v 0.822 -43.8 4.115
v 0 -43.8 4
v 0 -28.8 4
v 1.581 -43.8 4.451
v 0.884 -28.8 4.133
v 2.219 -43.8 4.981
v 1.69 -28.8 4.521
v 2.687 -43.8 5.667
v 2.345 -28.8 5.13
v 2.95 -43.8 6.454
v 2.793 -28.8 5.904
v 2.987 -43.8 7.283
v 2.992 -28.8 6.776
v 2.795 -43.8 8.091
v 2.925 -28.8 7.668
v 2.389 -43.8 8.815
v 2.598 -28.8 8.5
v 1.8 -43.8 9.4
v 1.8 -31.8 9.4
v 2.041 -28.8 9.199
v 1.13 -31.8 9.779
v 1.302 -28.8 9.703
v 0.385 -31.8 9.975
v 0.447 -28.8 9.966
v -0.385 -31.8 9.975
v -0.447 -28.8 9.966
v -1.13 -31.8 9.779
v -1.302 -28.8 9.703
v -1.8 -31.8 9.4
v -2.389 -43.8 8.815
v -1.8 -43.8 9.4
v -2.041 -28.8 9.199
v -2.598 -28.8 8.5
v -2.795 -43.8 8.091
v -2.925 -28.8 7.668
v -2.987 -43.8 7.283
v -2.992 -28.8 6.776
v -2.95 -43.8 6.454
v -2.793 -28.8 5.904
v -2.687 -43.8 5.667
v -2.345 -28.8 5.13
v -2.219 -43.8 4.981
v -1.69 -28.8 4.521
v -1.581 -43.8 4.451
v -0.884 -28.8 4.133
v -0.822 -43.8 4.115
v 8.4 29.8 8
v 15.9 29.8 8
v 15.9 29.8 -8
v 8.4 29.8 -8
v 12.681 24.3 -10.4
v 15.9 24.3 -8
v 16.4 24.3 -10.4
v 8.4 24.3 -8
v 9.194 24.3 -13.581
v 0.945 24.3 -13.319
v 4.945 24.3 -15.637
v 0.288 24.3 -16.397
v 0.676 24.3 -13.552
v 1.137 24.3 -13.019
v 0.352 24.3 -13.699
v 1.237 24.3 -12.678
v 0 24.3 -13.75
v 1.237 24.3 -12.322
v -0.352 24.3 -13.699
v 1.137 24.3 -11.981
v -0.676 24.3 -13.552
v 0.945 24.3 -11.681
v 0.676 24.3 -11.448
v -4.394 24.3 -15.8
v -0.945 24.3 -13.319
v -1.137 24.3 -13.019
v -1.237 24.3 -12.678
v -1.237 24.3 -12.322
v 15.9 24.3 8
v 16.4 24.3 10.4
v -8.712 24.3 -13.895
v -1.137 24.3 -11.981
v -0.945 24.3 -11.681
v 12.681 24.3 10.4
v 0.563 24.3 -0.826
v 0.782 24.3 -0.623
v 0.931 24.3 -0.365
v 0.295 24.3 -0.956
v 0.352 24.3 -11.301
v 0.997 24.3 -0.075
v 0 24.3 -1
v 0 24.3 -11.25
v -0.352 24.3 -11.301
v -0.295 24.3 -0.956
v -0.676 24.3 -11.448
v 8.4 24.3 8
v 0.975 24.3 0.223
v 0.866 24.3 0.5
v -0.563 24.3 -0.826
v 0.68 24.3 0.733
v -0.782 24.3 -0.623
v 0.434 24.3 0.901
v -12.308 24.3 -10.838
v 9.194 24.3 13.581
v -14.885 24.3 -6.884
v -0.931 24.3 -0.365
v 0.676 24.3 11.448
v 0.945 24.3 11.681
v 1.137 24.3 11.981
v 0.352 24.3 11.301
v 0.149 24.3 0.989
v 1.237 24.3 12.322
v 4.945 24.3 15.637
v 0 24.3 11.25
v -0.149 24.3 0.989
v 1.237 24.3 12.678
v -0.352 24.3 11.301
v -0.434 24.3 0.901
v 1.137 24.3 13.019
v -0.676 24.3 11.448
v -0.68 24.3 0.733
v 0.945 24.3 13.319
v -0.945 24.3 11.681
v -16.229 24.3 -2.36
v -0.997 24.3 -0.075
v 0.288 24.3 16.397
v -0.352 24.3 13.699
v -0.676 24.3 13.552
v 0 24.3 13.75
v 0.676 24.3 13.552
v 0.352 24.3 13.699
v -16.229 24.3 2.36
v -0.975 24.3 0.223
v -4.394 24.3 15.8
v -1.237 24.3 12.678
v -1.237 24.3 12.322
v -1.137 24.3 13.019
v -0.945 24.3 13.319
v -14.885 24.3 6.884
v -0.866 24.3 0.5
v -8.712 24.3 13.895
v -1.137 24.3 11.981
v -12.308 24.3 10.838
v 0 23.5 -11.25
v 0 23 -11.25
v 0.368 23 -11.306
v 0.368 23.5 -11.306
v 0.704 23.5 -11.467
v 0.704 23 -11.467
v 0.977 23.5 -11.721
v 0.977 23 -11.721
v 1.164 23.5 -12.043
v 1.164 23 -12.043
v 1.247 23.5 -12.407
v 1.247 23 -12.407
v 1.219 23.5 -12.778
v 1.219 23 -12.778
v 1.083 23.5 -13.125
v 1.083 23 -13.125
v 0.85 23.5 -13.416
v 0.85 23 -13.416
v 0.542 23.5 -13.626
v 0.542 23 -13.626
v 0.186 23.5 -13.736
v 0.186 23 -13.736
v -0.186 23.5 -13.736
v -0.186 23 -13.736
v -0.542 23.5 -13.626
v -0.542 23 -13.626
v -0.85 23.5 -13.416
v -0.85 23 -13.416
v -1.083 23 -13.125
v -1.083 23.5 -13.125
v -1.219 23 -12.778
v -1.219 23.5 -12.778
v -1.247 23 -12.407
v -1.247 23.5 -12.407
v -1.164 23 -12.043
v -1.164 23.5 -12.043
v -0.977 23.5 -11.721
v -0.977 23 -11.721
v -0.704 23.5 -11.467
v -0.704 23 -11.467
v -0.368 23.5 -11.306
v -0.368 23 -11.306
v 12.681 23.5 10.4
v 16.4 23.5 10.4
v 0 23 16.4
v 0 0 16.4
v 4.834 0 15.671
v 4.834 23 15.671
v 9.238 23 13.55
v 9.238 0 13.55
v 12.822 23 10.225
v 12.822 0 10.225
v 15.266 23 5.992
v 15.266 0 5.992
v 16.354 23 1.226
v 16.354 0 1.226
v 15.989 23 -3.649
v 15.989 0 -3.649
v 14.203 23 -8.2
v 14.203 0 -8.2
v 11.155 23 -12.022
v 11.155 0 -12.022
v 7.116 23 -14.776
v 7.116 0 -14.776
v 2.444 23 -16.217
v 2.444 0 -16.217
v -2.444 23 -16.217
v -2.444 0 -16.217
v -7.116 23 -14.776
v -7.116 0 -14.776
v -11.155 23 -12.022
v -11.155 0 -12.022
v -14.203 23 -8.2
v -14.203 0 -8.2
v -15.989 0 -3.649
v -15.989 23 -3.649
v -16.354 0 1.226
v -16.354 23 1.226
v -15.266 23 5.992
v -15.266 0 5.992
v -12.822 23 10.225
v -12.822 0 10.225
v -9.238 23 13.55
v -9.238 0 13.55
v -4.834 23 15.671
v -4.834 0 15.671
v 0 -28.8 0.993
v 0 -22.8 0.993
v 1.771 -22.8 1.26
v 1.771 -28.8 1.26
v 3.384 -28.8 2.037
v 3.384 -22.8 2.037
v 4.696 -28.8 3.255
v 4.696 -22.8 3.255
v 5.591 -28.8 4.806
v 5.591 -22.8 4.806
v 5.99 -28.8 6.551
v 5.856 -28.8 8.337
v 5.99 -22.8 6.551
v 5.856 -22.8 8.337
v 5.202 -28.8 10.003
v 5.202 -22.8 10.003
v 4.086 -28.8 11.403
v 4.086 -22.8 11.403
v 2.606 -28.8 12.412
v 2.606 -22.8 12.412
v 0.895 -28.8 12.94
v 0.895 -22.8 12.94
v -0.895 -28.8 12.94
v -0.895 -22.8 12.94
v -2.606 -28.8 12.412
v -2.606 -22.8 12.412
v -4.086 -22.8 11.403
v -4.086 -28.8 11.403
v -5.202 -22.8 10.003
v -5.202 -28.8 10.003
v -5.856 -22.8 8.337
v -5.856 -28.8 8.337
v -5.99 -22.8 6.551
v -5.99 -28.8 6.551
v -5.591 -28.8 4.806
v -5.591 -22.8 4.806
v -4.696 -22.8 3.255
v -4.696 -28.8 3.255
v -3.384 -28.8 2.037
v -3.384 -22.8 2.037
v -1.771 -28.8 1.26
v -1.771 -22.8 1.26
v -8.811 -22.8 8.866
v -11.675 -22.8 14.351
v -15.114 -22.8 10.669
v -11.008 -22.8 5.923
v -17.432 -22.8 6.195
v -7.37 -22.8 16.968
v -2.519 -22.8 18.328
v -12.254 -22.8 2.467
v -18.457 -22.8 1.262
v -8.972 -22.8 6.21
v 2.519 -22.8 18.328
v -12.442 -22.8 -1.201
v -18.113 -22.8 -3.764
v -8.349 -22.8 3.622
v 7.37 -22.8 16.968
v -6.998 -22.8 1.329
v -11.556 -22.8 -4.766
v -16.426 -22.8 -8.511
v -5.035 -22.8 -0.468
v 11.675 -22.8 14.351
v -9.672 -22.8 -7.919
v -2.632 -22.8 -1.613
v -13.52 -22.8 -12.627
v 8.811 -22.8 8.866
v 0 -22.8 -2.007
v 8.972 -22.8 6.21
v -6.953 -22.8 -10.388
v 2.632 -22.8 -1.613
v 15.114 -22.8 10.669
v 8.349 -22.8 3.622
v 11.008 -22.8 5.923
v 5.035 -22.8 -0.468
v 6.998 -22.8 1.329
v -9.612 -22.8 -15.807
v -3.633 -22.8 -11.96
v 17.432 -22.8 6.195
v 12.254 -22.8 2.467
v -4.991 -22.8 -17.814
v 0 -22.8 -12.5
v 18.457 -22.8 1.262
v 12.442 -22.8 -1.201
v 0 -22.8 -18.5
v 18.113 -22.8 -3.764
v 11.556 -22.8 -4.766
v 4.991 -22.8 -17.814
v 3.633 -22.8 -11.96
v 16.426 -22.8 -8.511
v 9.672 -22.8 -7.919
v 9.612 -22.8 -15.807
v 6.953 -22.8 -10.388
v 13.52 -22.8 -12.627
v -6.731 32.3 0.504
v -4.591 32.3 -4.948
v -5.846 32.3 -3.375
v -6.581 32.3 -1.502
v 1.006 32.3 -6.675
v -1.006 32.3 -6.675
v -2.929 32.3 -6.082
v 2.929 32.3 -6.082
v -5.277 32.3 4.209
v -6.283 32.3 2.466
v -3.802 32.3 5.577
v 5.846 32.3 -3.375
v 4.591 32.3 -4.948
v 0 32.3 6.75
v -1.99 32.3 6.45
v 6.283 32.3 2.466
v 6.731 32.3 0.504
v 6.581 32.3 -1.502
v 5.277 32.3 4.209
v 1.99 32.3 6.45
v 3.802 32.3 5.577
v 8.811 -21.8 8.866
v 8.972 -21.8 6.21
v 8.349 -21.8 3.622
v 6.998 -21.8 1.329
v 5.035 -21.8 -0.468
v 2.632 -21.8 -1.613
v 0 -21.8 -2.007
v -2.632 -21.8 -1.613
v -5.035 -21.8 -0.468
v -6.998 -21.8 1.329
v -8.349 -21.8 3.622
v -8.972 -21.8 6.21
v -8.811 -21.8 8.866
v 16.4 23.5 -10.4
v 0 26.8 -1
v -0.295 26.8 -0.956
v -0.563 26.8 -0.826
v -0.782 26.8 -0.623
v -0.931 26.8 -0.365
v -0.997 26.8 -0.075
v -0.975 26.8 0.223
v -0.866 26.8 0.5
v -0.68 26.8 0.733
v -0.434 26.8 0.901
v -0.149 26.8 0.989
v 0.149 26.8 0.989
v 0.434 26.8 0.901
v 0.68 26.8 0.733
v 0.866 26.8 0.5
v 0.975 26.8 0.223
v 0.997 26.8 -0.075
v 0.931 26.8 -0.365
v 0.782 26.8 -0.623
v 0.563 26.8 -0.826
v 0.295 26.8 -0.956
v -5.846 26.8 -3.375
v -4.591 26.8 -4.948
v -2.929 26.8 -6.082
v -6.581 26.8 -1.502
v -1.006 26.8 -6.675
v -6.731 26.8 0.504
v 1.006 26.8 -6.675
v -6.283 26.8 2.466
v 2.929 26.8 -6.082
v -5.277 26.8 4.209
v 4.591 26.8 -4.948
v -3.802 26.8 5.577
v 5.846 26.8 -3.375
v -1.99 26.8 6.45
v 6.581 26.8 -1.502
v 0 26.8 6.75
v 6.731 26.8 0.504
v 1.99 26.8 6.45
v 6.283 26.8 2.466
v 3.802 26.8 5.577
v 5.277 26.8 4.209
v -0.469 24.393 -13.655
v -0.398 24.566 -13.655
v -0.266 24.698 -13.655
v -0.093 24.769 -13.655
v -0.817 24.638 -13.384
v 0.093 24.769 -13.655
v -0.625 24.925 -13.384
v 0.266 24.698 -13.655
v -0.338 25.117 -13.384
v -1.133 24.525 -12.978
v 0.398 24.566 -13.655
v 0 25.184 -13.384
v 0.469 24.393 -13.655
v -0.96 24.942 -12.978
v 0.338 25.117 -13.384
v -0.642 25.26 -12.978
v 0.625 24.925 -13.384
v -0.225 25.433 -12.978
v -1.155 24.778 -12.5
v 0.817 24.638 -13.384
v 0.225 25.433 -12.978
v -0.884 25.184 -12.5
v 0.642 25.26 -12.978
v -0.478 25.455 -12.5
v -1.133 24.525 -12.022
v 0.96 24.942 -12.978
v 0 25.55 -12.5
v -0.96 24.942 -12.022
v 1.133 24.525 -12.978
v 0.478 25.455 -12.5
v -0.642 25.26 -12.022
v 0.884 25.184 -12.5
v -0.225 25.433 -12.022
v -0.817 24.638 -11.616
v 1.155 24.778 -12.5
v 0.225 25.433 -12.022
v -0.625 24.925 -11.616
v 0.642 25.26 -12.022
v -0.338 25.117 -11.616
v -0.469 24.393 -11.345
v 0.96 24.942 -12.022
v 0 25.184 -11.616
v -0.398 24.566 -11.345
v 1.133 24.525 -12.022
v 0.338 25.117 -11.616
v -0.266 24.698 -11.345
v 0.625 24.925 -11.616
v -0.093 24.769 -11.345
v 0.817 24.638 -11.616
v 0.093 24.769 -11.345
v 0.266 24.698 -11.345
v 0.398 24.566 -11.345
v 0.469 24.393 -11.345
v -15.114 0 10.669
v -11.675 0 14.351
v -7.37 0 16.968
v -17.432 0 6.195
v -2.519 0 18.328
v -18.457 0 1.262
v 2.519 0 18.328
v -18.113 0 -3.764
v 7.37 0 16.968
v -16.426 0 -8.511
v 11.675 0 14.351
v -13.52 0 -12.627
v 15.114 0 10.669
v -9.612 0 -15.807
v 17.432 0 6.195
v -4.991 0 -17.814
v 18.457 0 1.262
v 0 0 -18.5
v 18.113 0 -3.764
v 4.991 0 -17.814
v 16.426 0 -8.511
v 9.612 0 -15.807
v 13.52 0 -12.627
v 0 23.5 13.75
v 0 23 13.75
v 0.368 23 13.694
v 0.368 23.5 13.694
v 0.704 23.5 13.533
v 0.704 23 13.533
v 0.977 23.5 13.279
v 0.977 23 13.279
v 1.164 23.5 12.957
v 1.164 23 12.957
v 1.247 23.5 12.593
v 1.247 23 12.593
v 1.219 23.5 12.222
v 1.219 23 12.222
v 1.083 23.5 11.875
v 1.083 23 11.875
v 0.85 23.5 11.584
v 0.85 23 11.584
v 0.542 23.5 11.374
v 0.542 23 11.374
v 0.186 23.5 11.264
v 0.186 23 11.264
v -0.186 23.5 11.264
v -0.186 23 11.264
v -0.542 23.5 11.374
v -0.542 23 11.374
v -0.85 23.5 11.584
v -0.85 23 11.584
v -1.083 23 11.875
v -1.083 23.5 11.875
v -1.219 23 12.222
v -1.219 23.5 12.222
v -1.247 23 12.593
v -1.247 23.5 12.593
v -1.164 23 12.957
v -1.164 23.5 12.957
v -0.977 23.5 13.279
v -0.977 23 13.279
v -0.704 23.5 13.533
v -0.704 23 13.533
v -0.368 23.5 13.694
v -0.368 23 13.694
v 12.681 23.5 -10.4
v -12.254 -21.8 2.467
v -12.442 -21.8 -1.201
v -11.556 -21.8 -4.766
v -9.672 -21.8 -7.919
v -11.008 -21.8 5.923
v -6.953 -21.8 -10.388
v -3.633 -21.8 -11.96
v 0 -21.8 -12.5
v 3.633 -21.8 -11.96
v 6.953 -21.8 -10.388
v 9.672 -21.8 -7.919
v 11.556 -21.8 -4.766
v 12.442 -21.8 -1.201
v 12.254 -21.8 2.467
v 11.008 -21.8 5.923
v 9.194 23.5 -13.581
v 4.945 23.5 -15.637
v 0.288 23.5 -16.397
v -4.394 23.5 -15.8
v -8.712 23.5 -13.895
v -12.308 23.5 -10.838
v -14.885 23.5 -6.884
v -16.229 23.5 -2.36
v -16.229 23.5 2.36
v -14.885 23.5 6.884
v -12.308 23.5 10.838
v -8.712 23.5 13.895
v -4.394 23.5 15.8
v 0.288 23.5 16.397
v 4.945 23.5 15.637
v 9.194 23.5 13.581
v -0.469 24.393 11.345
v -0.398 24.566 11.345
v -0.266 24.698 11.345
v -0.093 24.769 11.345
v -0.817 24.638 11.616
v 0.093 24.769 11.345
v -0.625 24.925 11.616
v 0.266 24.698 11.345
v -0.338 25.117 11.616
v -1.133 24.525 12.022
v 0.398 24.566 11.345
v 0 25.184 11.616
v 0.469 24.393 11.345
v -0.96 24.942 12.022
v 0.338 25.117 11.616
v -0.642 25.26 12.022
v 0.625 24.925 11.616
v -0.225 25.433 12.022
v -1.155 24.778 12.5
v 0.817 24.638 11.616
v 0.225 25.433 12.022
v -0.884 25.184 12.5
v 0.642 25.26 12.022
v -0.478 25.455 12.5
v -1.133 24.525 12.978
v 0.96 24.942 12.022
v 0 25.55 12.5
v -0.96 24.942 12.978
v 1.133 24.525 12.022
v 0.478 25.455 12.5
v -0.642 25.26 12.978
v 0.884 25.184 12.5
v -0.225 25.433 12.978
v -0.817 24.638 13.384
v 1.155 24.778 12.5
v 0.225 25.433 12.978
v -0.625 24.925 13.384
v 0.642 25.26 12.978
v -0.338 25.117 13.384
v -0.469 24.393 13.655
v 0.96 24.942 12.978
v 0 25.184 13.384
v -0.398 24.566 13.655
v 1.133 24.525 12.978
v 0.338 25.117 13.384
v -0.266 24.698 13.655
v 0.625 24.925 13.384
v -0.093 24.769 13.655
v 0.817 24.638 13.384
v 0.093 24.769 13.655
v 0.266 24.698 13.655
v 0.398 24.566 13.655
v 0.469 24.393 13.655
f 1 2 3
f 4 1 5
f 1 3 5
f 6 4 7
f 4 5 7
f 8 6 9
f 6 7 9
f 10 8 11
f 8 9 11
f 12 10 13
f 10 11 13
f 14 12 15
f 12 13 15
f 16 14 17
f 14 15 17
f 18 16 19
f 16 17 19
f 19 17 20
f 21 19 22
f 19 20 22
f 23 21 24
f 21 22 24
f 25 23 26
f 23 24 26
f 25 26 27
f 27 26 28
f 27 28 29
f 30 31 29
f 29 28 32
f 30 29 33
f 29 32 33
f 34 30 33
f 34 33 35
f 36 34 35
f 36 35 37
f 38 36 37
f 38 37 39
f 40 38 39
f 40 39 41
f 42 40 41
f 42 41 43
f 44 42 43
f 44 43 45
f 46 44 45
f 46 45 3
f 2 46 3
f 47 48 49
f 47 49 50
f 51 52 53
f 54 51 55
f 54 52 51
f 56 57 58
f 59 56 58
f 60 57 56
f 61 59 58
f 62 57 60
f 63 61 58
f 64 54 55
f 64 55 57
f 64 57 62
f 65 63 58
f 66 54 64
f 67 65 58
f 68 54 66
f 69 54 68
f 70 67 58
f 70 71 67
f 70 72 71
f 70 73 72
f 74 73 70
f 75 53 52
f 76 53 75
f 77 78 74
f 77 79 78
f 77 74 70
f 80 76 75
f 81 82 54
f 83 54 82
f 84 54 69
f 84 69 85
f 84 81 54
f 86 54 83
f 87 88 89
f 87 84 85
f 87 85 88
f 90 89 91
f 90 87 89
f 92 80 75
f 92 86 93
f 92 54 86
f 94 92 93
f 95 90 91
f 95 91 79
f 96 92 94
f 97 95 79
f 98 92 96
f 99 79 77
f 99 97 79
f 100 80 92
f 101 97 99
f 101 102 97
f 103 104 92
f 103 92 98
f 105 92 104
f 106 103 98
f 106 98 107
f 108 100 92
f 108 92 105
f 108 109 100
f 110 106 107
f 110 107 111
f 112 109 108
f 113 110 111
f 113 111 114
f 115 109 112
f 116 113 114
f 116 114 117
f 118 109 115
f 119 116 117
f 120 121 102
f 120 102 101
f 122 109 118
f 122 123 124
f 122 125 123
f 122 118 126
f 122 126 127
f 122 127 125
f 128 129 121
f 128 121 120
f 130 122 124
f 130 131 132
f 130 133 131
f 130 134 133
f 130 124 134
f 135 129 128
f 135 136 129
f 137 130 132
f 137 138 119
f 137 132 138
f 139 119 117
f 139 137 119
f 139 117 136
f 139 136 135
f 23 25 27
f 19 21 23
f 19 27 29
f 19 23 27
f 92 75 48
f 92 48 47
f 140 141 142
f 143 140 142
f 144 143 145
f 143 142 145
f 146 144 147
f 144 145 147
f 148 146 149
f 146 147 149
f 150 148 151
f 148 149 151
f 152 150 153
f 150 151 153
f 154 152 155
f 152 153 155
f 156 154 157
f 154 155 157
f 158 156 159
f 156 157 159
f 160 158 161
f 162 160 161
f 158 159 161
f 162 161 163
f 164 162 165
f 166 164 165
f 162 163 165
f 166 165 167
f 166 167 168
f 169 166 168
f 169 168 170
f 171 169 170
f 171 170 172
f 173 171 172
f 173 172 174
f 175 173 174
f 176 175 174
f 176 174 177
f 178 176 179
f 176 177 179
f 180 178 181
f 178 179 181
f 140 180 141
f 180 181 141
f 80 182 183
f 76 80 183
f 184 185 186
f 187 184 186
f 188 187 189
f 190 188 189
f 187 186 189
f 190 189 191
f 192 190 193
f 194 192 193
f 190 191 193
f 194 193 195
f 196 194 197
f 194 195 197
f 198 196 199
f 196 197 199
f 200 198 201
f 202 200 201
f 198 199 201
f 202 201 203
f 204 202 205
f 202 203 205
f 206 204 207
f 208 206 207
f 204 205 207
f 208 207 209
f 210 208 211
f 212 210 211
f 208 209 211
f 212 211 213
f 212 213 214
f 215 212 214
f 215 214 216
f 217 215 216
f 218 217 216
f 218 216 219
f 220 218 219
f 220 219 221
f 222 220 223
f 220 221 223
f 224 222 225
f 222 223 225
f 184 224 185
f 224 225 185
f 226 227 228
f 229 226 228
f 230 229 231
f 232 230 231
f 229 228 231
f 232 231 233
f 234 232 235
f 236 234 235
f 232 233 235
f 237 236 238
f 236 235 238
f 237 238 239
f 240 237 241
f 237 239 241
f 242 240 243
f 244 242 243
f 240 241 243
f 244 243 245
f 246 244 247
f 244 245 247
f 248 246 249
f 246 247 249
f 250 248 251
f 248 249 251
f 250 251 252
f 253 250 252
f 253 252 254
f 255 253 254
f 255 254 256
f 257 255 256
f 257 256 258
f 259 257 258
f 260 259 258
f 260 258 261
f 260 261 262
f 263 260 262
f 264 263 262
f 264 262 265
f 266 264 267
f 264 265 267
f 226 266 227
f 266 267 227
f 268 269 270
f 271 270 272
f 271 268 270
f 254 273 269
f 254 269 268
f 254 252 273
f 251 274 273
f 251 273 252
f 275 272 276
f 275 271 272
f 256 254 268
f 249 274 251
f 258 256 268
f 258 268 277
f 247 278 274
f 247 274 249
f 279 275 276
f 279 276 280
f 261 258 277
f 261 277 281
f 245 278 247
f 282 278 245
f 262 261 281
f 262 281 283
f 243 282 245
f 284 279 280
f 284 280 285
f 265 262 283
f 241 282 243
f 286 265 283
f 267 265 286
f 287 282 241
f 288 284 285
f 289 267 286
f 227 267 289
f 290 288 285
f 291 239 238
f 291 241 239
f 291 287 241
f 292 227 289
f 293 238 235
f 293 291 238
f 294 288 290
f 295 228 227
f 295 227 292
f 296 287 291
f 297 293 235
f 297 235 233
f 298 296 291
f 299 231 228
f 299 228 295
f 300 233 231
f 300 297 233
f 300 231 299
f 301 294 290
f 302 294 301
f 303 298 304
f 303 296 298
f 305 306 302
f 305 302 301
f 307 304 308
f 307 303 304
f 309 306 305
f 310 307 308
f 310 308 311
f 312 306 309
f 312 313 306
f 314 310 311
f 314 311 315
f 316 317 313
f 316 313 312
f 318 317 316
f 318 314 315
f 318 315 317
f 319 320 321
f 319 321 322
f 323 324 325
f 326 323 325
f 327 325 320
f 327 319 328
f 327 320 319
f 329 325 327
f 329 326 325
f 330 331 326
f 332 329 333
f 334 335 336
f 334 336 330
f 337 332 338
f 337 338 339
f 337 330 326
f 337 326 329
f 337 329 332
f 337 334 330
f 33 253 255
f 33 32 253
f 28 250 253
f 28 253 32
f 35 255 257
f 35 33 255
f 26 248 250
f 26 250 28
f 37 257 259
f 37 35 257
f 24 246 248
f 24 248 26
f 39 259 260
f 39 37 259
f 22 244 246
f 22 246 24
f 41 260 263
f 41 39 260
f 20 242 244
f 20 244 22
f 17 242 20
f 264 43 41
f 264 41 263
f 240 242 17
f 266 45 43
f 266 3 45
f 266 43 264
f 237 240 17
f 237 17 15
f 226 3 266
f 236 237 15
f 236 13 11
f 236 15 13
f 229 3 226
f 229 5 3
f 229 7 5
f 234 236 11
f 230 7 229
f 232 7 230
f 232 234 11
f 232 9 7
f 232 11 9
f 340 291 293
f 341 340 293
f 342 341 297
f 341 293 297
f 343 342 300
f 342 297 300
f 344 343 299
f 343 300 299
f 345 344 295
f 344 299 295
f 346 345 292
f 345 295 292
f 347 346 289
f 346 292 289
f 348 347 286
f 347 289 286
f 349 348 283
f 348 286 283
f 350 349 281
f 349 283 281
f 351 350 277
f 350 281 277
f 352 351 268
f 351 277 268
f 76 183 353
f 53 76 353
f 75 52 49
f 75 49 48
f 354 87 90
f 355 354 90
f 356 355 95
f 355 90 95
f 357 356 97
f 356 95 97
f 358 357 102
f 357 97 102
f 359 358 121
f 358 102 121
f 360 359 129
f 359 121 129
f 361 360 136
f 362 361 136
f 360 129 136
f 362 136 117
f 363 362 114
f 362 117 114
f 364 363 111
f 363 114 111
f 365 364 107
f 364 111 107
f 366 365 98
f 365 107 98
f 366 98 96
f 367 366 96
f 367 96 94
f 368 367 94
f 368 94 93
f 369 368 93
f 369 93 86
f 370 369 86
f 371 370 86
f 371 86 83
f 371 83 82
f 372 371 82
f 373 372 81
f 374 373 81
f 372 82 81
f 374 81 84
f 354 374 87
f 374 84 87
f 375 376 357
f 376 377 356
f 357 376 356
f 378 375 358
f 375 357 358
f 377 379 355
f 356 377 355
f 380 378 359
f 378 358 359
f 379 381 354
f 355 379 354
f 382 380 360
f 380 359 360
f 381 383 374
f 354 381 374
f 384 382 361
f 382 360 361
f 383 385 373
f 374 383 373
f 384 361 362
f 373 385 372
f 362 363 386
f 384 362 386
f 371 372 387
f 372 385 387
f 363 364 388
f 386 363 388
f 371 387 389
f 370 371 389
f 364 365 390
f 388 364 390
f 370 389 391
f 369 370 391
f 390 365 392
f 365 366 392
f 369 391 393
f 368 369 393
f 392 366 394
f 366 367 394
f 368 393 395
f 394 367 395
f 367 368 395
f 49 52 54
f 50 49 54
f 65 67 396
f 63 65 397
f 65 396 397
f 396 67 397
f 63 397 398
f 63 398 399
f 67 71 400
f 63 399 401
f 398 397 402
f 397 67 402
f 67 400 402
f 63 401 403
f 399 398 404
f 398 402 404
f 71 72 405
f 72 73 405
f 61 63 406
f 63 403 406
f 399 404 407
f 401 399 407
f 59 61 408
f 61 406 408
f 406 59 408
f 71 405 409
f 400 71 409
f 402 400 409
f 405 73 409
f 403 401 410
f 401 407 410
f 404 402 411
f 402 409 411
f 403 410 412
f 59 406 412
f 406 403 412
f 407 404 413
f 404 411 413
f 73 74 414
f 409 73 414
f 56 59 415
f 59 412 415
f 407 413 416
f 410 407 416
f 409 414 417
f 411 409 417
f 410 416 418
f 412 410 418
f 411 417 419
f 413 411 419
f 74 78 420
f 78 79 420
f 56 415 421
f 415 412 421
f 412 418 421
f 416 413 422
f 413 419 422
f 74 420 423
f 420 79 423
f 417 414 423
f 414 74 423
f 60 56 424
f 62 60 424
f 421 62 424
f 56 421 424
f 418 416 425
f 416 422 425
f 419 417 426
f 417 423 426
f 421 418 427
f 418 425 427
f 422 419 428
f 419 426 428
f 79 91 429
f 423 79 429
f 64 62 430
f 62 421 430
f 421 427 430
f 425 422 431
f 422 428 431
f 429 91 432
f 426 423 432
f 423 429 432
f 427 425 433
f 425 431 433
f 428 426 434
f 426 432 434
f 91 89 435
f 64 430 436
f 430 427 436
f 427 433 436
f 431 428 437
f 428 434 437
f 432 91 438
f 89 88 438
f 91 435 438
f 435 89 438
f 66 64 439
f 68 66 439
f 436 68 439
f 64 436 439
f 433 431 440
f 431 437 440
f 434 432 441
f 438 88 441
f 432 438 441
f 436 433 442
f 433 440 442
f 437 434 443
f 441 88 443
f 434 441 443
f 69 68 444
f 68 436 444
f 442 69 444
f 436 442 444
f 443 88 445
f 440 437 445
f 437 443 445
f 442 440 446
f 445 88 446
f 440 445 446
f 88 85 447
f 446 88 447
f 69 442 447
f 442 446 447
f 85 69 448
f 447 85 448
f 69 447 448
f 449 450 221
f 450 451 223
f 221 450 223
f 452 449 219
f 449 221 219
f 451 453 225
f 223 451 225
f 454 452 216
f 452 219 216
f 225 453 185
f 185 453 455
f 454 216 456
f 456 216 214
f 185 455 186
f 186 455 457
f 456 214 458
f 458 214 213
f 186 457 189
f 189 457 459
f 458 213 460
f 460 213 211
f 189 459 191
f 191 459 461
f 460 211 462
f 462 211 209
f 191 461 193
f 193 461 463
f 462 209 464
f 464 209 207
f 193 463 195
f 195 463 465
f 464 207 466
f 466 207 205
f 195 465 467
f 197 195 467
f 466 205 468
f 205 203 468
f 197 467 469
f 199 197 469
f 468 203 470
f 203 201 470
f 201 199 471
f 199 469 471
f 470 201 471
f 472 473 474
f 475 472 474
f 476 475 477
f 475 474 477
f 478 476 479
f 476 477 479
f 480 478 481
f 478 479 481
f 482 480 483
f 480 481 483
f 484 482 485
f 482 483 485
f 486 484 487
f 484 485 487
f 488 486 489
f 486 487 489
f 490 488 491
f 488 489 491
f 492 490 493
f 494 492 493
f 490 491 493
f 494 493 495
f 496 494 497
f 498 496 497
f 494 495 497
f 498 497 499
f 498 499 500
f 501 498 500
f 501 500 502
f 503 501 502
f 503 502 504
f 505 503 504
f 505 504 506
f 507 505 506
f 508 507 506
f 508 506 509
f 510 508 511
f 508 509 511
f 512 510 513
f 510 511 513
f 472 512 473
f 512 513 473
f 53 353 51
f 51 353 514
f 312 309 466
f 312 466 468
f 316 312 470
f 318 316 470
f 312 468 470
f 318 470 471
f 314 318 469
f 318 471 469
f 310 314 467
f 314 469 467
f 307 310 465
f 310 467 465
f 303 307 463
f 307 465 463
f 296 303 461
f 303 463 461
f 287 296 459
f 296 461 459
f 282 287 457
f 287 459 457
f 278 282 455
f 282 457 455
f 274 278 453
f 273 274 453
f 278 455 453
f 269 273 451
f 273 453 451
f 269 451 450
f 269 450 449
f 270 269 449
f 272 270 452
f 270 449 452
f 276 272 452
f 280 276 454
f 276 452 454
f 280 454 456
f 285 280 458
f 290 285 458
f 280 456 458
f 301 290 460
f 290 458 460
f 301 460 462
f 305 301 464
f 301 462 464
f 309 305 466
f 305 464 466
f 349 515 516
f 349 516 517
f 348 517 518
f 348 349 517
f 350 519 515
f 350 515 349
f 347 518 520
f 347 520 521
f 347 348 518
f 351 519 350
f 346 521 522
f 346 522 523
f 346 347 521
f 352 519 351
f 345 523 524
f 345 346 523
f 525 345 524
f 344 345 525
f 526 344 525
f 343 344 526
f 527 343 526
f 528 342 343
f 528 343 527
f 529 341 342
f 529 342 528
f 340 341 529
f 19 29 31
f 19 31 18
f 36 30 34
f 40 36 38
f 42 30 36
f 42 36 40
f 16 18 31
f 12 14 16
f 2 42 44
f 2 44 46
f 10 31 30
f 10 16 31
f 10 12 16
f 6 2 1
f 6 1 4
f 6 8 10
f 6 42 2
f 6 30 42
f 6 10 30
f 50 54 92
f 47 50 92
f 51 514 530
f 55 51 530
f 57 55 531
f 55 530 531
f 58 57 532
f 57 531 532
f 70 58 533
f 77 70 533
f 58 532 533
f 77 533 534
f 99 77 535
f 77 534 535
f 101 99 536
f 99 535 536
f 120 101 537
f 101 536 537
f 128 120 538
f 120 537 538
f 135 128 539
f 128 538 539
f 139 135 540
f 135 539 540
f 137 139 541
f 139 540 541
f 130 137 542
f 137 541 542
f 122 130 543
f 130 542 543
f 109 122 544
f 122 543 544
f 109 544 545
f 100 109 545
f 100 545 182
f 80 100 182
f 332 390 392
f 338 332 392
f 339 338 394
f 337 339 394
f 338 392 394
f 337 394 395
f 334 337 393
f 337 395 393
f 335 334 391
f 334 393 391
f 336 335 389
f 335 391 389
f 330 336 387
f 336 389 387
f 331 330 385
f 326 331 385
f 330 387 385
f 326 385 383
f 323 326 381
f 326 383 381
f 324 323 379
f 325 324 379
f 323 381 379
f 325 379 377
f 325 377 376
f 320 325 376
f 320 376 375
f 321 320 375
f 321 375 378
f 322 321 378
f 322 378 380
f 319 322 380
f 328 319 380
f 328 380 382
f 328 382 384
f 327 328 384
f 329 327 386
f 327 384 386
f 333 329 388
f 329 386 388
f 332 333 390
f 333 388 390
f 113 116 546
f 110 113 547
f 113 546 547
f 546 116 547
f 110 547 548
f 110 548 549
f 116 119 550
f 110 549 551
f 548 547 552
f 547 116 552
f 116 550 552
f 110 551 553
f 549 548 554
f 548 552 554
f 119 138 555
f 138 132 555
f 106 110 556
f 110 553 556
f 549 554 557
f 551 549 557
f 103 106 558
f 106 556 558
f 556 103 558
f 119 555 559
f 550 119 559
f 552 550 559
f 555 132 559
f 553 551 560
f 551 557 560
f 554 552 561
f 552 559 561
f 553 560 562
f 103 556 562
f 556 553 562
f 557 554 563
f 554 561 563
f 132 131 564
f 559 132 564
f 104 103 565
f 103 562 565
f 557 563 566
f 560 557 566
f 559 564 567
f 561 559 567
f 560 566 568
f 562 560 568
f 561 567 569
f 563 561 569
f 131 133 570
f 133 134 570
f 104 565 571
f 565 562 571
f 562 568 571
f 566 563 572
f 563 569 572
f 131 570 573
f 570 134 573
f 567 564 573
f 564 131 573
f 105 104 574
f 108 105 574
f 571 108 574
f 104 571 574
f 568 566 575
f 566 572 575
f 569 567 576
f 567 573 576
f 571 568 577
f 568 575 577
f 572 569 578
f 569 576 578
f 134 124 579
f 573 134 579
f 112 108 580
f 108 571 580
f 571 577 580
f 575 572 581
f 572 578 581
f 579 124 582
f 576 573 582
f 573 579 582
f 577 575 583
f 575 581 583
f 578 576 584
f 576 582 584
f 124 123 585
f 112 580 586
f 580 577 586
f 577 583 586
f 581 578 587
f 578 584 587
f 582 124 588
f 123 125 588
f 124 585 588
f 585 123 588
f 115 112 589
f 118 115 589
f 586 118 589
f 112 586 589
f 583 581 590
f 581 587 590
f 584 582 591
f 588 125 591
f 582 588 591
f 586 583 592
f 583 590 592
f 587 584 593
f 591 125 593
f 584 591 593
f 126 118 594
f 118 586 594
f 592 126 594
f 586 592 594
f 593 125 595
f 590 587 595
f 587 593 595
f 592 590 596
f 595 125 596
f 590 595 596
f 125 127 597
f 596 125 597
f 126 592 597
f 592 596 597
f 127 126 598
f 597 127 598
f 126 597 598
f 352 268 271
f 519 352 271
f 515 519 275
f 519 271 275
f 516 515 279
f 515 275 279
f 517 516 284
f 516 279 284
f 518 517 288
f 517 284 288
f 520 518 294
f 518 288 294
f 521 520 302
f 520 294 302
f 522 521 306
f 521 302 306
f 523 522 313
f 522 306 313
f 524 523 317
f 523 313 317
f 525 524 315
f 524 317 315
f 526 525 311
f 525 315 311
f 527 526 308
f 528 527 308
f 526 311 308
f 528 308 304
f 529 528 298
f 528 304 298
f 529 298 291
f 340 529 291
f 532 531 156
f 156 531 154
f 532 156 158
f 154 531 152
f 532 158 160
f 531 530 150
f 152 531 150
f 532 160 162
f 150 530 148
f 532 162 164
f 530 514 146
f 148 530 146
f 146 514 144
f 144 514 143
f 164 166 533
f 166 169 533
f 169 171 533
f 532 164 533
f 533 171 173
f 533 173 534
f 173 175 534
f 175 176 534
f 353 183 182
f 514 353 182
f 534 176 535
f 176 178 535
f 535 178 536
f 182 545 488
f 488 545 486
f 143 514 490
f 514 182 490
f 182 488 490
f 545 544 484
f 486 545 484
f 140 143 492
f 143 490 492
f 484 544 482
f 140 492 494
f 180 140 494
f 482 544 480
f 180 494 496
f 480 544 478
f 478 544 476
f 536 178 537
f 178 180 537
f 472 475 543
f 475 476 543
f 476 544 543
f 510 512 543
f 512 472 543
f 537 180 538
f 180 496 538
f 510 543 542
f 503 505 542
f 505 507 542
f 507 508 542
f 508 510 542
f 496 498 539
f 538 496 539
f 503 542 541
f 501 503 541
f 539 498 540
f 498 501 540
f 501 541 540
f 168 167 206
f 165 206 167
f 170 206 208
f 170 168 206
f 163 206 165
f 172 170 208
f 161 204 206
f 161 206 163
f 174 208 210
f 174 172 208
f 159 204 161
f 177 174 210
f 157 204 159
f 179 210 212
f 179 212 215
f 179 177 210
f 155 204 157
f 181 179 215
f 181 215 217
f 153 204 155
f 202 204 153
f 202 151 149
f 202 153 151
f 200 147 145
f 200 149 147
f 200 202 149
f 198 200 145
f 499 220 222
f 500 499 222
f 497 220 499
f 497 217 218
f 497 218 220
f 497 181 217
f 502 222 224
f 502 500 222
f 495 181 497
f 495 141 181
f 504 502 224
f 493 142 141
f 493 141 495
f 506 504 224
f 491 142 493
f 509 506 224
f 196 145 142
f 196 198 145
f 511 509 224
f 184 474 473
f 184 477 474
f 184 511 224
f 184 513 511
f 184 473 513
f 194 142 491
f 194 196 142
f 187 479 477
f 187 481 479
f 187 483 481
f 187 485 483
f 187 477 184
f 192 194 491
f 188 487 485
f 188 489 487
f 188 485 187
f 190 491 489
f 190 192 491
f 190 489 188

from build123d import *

# Parameters (mm, degrees)
SKETCH1_R            = 16.4
BOSS_EXTRUDE1_DEPTH  = 23
SKETCH2_R            = 1.25
BOSS_EXTRUDE2_DEPTH  = 0.5
SKETCH4_R            = 18.5
BOSS_EXTRUDE4_DEPTH  = 22.8
CUT_EXTRUDE1_DEPTH   = 1
SKETCH6_R            = 6.006706661
BOSS_EXTRUDE5_DEPTH  = 6
SKETCH7_R            = 3
BOSS_EXTRUDE6_DEPTH  = 15
CUT_EXTRUDE2_START   = -12
CUT_EXTRUDE2_DEPTH   = 12
BOSS_EXTRUDE7_DEPTH  = 0.8
REVOLVE4_ANGLE       = 180
SKETCH13_R           = 1
BOSS_EXTRUDE9_DEPTH  = 2.5
SKETCH14_R           = 6.75
BOSS_EXTRUDE10_DEPTH = 5.5
SKETCH15_W           = 7.5
SKETCH15_H           = 16
BOSS_EXTRUDE11_DEPTH = 5.5


with BuildPart() as part:
    # Sketch1 → Boss-Extrude1 (new body)
    with BuildSketch(Plane(origin=(0, 0, 0), x_dir=(-1, 0, 0), z_dir=(0, 1, 0))):
        with Locations(Location((0, 0, 0), (0, 0, 90))):
            Circle(SKETCH1_R)
    extrude(amount=BOSS_EXTRUDE1_DEPTH)

    # Sketch2 → Boss-Extrude2 (add)
    with BuildSketch(Plane(origin=(0, 23, 0), x_dir=(-1, 0, 0), z_dir=(0, 1, 0))):
        with Locations(Location((0, 12.5, 0), (0, 0, 90))):
            Circle(SKETCH2_R)
        with Locations(Location((0, -12.5, 0), (0, 0, 90))):
            Circle(SKETCH2_R)
    extrude(amount=BOSS_EXTRUDE2_DEPTH)

    # Sketch4 → Boss-Extrude4 (add)
    with BuildSketch(Plane.XZ):
        with Locations(Location((0, 0, 0), (0, 0, 270))):
            Circle(SKETCH4_R)
    extrude(amount=BOSS_EXTRUDE4_DEPTH)

    # Sketch5 → Cut-Extrude1 (cut)
    with BuildSketch(Plane.XZ.offset(22.8)):
        with BuildLine():
            ThreePointArc((-8.811209519, 8.866373938), (0, -12.5), (8.811209519, 8.866373938))
            ThreePointArc((8.811209519, 8.866373938), (0, -2.006706661), (-8.811209519, 8.866373938))
        make_face()
    extrude(amount=-CUT_EXTRUDE1_DEPTH, mode=Mode.SUBTRACT)

    # Sketch6 → Boss-Extrude5 (add)
    with BuildSketch(Plane.XZ.offset(22.8)):
        with Locations(Location((0, 7, 0), (0, 0, 270))):
            Circle(SKETCH6_R)
    extrude(amount=BOSS_EXTRUDE5_DEPTH)

    # Sketch7 → Boss-Extrude6 (add)
    with BuildSketch(Plane.XZ.offset(28.8)):
        with Locations(Location((0, 7, 0), (0, 0, 270))):
            Circle(SKETCH7_R)
    extrude(amount=BOSS_EXTRUDE6_DEPTH)

    # Sketch8 → Cut-Extrude2 (cut)
    with BuildSketch(Plane.XZ.offset(43.8).offset(CUT_EXTRUDE2_START)):
        with BuildLine():
            Line((-1.8, 9.4), (1.8, 9.4))
            ThreePointArc((1.8, 9.4), (0, 10), (-1.8, 9.4))
        make_face()
    extrude(amount=CUT_EXTRUDE2_DEPTH, mode=Mode.SUBTRACT)

    # Sketch9 → Boss-Extrude7 (add)
    with BuildSketch(Plane(origin=(0, 23.5, 0), x_dir=(-1, 0, 0), z_dir=(0, 1, 0))):
        with BuildLine():
            Line((-12.680693987, 10.4), (-16.4, 10.4))
            Line((-16.4, 10.4), (-16.4, -10.4))
            Line((-16.4, -10.4), (-12.680693987, -10.4))
            ThreePointArc((-12.680693987, -10.4), (16.4, 0), (-12.680693987, 10.4))
        make_face()
    extrude(amount=BOSS_EXTRUDE7_DEPTH)

    # Sketch10 → Revolve4 (revolve)
    with BuildSketch(Plane(origin=(0, 24.3, 0), x_dir=(-1, 0, 0), z_dir=(0, 1, 0))):
        with BuildLine():
            Line((0, 13.75), (0, 11.25))
            ThreePointArc((0, 11.25), (1.25, 12.5), (0, 13.75))
        make_face()
        with BuildLine():
            Line((0, -11.25), (0, -13.75))
            ThreePointArc((0, -13.75), (1.25, -12.5), (0, -11.25))
        make_face()
    revolve(axis=Axis((0, 24.3, 12.5), (0, 0, -1)), revolution_arc=REVOLVE4_ANGLE)

    # Sketch13 → Boss-Extrude9 (add)
    with BuildSketch(Plane(origin=(0, 24.3, 0), x_dir=(-1, 0, 0), z_dir=(0, 1, 0))):
        with Locations(Location((0, 0, 0), (0, 0, 270))):
            Circle(SKETCH13_R)
    extrude(amount=BOSS_EXTRUDE9_DEPTH)

    # Sketch14 → Boss-Extrude10 (add)
    with BuildSketch(Plane(origin=(0, 26.8, 0), x_dir=(-1, 0, 0), z_dir=(0, 1, 0))):
        with Locations(Location((0, 0, 0), (0, 0, 90))):
            Circle(SKETCH14_R)
    extrude(amount=BOSS_EXTRUDE10_DEPTH)

    # Sketch15 → Boss-Extrude11 (add)
    with BuildSketch(Plane(origin=(0, 24.3, 0), x_dir=(-1, 0, 0), z_dir=(0, 1, 0))):
        with Locations((-12.15, 0)):
            Rectangle(SKETCH15_W, SKETCH15_H)
    extrude(amount=BOSS_EXTRUDE11_DEPTH)


solid = part.part
